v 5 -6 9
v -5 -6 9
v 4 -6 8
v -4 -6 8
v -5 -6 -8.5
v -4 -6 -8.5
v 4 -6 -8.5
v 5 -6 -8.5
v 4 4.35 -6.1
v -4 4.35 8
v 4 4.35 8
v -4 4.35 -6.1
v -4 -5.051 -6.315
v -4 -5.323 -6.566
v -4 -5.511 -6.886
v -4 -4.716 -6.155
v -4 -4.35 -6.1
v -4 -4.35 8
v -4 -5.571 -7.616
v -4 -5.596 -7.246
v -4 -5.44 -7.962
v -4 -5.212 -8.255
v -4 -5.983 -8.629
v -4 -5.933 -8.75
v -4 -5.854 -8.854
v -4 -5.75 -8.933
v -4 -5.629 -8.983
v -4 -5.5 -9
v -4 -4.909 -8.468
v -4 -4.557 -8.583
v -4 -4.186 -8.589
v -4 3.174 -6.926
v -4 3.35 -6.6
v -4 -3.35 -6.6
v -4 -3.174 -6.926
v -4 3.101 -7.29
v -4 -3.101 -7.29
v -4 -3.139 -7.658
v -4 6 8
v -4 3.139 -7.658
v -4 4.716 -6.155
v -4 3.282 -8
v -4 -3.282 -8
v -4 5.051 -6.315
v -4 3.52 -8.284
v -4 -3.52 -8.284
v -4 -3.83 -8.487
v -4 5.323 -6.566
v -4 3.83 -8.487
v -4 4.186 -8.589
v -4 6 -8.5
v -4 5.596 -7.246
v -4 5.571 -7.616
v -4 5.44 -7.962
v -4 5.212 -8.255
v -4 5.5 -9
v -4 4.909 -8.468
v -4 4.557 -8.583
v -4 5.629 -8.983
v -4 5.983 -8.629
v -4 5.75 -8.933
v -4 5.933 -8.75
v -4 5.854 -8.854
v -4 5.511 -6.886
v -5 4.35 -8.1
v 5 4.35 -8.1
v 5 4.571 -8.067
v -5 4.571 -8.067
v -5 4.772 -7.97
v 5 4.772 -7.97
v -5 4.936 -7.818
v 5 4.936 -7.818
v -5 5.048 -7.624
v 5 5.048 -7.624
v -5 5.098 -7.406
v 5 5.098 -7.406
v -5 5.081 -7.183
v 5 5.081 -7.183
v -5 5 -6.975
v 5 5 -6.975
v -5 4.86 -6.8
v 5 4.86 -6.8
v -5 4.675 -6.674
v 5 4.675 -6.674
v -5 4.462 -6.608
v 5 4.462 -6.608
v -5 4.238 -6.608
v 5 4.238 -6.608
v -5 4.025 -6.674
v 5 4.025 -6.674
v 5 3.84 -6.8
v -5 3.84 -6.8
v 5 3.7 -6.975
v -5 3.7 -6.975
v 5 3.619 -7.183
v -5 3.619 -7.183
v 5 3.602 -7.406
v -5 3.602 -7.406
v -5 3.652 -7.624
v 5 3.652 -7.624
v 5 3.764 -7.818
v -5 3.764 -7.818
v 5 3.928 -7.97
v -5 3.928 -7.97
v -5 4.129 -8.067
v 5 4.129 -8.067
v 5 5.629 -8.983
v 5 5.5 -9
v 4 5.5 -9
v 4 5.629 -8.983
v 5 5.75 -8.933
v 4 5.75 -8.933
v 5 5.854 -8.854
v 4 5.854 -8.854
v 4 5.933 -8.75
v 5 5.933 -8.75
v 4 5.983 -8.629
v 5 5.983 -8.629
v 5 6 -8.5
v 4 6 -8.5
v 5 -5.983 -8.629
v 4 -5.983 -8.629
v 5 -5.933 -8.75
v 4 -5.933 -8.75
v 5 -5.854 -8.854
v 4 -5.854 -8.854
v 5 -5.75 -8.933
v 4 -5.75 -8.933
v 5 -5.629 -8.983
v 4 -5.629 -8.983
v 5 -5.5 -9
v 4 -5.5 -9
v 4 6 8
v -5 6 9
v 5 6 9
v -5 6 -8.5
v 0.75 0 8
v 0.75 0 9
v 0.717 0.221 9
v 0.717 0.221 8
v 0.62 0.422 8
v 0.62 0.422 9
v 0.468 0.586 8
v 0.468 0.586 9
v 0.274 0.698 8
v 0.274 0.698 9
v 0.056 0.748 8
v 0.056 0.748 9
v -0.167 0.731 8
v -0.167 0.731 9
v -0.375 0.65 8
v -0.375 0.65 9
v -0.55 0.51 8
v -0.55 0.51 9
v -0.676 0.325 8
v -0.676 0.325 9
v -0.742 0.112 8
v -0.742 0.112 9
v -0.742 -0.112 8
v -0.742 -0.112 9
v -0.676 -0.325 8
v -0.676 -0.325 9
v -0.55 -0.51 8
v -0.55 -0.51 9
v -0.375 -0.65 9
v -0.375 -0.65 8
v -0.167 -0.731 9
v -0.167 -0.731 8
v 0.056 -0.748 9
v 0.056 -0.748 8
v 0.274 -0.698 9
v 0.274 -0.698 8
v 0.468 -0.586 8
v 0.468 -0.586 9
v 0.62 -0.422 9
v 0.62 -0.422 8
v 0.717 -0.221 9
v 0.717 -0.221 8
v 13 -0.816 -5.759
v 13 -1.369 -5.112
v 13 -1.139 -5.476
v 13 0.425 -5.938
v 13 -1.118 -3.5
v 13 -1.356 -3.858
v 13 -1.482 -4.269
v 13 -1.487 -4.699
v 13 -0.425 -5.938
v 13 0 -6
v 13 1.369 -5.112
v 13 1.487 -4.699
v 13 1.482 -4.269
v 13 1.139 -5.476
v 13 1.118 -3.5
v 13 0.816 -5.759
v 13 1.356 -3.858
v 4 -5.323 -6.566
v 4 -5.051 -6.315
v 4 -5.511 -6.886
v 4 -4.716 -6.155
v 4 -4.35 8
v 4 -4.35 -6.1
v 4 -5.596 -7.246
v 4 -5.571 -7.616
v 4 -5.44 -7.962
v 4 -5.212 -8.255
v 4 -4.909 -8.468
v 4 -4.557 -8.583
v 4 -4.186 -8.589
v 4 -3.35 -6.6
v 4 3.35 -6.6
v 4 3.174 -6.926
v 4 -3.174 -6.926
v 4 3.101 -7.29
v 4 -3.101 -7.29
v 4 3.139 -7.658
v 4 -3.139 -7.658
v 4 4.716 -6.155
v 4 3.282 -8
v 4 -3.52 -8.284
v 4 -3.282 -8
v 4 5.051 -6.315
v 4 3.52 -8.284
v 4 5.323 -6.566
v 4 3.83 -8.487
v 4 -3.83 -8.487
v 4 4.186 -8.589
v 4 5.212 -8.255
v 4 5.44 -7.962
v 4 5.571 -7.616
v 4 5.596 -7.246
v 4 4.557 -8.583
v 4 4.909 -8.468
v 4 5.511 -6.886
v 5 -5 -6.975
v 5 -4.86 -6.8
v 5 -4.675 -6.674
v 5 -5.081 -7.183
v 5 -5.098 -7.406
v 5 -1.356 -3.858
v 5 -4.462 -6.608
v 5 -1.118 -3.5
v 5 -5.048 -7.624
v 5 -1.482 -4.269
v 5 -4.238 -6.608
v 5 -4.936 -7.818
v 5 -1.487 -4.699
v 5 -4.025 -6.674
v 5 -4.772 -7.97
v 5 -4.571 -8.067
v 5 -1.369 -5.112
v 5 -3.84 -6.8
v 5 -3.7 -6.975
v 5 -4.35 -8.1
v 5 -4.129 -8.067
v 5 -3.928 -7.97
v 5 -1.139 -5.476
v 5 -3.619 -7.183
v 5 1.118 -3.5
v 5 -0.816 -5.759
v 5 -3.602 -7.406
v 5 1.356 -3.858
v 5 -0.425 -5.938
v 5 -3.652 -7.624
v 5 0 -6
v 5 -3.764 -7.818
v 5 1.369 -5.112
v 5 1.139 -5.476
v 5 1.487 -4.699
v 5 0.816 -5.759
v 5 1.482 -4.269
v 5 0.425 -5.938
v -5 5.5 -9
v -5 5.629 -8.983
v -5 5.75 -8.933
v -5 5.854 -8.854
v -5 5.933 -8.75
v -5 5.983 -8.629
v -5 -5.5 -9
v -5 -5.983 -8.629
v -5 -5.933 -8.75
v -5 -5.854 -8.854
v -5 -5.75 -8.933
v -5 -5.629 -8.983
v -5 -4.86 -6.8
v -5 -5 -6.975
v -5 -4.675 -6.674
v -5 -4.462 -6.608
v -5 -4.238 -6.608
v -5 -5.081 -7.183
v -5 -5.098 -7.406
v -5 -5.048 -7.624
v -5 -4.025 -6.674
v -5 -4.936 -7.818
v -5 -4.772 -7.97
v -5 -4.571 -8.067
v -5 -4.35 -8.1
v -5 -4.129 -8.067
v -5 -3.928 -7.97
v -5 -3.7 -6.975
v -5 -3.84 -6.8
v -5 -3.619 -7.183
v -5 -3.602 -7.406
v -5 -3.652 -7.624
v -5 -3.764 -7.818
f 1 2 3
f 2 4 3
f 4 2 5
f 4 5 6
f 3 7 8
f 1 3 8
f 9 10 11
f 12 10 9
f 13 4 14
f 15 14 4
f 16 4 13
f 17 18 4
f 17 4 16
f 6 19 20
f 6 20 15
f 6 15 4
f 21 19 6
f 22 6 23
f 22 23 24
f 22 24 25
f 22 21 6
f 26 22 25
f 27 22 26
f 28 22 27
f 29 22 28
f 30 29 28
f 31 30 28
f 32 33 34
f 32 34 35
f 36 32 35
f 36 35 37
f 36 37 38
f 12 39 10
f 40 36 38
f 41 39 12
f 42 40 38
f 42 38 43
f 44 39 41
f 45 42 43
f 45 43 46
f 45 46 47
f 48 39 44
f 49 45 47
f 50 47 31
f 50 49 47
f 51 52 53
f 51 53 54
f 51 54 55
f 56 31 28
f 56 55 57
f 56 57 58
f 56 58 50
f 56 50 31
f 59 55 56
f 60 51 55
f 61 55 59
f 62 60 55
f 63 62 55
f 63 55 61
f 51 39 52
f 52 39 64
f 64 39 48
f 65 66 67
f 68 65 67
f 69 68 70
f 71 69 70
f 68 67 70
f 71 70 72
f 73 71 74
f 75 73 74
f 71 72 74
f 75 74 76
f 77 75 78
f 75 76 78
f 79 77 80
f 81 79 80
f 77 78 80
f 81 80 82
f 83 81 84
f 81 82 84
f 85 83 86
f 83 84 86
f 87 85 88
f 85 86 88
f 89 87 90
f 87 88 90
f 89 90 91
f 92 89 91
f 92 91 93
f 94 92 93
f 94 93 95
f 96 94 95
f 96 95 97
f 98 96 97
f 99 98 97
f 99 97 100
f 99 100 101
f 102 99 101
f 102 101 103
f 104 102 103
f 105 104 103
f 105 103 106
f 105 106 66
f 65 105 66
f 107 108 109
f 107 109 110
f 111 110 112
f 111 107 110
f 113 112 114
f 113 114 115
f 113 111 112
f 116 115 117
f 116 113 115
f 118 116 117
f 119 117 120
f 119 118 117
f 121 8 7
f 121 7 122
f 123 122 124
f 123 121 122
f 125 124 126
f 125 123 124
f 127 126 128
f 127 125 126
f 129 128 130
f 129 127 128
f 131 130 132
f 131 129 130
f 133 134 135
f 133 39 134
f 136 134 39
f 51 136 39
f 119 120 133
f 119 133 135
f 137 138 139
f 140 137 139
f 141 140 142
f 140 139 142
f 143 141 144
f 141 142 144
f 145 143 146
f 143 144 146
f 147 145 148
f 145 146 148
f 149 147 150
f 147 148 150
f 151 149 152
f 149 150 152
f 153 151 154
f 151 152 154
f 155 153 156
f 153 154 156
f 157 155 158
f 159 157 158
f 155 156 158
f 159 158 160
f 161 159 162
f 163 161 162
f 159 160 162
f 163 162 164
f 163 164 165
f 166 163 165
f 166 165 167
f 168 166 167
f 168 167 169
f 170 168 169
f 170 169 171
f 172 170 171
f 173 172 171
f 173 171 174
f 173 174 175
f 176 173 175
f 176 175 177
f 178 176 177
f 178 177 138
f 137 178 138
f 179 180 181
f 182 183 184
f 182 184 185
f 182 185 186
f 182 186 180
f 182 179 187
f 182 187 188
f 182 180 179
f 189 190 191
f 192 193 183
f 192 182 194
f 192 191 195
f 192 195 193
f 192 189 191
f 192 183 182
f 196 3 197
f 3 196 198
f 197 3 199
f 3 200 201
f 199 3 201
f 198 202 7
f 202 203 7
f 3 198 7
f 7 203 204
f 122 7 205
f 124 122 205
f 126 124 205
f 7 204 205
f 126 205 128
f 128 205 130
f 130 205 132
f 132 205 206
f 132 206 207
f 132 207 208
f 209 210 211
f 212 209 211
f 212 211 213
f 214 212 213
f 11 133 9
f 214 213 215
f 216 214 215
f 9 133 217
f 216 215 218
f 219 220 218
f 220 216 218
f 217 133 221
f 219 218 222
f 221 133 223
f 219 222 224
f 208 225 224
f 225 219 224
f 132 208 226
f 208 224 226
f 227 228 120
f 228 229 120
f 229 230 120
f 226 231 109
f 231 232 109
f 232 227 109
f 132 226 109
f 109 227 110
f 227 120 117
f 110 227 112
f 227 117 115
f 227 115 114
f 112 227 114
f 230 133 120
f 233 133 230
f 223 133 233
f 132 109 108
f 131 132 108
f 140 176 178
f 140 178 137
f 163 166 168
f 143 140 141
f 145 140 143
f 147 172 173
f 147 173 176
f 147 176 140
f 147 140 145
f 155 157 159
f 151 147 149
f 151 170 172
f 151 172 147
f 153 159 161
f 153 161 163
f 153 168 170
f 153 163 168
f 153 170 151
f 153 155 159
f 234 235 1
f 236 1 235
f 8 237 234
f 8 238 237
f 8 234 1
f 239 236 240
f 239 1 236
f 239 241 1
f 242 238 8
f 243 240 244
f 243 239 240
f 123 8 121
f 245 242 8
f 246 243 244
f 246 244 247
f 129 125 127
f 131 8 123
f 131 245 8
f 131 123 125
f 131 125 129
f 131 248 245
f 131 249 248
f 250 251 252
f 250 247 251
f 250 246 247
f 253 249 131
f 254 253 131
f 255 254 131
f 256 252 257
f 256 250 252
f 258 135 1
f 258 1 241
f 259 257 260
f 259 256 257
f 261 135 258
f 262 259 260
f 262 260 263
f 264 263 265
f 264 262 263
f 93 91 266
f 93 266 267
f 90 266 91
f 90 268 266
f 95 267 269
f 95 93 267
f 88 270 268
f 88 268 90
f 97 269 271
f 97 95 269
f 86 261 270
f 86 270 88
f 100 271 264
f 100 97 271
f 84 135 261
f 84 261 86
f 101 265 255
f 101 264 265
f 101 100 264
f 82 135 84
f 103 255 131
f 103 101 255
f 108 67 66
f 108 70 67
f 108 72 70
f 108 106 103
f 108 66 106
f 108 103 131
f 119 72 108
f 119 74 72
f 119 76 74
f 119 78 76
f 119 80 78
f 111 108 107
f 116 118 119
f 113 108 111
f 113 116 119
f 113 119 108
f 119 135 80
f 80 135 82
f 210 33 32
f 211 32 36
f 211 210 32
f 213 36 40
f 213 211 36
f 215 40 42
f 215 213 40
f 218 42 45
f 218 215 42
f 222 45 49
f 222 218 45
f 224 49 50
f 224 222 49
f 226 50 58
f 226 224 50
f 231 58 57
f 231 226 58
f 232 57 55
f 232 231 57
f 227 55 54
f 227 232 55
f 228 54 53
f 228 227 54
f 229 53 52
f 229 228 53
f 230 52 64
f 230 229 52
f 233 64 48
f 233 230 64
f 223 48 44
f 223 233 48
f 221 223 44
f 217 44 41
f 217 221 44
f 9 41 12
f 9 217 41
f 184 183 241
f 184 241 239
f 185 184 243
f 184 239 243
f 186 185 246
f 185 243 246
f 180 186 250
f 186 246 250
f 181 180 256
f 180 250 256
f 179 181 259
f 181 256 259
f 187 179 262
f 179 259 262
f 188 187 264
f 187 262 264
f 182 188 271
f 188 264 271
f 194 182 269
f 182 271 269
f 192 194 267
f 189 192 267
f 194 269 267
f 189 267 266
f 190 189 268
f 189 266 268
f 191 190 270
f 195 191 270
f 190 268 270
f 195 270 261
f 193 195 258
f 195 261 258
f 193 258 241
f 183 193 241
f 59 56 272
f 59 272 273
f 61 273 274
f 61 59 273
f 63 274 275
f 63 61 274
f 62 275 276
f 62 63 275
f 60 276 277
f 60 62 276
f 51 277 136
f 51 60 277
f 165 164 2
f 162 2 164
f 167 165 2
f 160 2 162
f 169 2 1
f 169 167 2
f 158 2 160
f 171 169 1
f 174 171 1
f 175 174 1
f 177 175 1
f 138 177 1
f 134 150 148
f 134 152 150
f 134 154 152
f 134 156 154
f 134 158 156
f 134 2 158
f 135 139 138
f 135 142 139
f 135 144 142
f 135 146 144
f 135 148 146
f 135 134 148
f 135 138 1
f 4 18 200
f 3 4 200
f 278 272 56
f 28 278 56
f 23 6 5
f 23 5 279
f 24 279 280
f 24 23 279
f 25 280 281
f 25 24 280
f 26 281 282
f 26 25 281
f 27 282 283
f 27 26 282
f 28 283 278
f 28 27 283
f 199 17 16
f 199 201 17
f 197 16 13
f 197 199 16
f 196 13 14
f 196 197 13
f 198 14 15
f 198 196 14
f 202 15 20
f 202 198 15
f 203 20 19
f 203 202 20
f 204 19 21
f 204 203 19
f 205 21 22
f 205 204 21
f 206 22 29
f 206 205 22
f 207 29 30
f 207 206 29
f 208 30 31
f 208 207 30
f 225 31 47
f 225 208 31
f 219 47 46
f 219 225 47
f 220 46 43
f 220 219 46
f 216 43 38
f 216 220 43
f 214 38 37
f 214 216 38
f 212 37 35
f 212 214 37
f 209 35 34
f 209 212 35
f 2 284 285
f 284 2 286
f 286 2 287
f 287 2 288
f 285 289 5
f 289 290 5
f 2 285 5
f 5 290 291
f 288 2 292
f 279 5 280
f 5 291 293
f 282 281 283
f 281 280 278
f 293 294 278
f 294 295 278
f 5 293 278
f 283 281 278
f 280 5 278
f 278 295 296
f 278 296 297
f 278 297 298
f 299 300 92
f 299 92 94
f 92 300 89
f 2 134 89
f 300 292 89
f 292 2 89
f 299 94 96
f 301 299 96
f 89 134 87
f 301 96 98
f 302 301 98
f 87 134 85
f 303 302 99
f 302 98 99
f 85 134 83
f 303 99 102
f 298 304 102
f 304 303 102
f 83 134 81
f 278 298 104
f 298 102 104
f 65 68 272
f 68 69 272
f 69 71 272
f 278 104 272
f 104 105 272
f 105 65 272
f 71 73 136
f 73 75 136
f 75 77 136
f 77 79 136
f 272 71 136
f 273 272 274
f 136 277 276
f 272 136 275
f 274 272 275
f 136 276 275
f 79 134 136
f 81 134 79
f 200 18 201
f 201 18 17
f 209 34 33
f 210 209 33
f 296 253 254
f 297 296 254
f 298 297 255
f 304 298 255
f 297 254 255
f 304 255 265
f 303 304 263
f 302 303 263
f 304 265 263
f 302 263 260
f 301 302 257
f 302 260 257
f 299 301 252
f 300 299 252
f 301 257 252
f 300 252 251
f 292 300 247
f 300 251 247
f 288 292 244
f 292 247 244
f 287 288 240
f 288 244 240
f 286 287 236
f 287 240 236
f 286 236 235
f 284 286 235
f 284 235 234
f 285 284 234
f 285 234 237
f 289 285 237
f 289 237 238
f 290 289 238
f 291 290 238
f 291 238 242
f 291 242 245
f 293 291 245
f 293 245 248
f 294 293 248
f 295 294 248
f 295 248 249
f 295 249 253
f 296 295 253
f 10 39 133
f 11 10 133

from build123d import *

# Parameters (mm, degrees)
ESBO_O1_W                = 10
ESBO_O1_H                = 18
RESSALTO_EXTRUS_O1_DEPTH = 6
RESSALTO_EXTRUS_O2_DEPTH = 8
FILETE1_R                = 0.5
ESBO_O3_W                = 8
ESBO_O3_H                = 17
CORTE_EXTRUS_O1_DEPTH    = 13
RESSALTO_EXTRUS_O3_REACH = 12
ESBO_O4_R                = 1.25
ESBO_O5_R                = 0.75
CORTE_EXTRUS_O2_DEPTH    = 11
CORTE_EXTRUS_O3_REACH    = 20
ESBO_O6_R                = 0.75
RESSALTO_EXTRUS_O6_REACH = 19
ESBO_O7_W                = 14.6
ESBO_O7_H                = 8.7


with BuildPart() as part:
    # Esboço1 → Ressalto-extrusão1 (new body, symmetric)
    with BuildSketch(Plane(origin=(0, 0, 0), x_dir=(1, 0, 0), z_dir=(0, 1, 0))):
        Rectangle(ESBO_O1_W, ESBO_O1_H)
    extrude(amount=RESSALTO_EXTRUS_O1_DEPTH, both=True)

    # Esboço2 → Ressalto-extrusão2 (add)
    with BuildSketch(Plane(origin=(5, 0, 0), x_dir=(0, 0, -1), z_dir=(1, 0, 0))):
        with BuildLine():
            Line((3.5, 1.118033989), (3.5, -1.118033989))
            ThreePointArc((3.5, -1.118033989), (6, 0), (3.5, 1.118033989))
        make_face()
    extrude(amount=RESSALTO_EXTRUS_O2_DEPTH)

    # Filete1
    filete1_edges = [part.edges().sort_by_distance(p)[0] for p in [
        (0, -6, -9),
        (0, 6, -9),
    ]]
    fillet(filete1_edges, radius=FILETE1_R)

    # Esboço3 → Corte-extrusão1 (cut, through all)
    with BuildSketch(Plane(origin=(0, 6, 0), x_dir=(1, 0, 0), z_dir=(0, 1, 0))):
        with Locations((0, 0.5)):
            Rectangle(ESBO_O3_W, ESBO_O3_H)
    extrude(amount=-CORTE_EXTRUS_O1_DEPTH, mode=Mode.SUBTRACT)

    # Esboço4 → Ressalto-extrusão3 (add, up to next)
    with BuildSketch(Plane(origin=(5, 0, 0), x_dir=(0, 0, -1), z_dir=(1, 0, 0)), mode=Mode.PRIVATE) as ressalto_extrus_o3_sk1:
        with Locations((7.35, 4.35)):
            Circle(ESBO_O4_R)
    ressalto_extrus_o3_tool1 = extrude(ressalto_extrus_o3_sk1.sketch, amount=-RESSALTO_EXTRUS_O3_REACH, mode=Mode.PRIVATE) - part.part
    add(ressalto_extrus_o3_tool1.solids().sort_by_distance((5, 4.35, -7.35))[0])
    # Esboço4 → Ressalto-extrusão3 (add, up to next)
    with BuildSketch(Plane(origin=(5, 0, 0), x_dir=(0, 0, -1), z_dir=(1, 0, 0)), mode=Mode.PRIVATE) as ressalto_extrus_o3_sk2:
        with Locations((7.35, -4.35)):
            Circle(ESBO_O4_R)
    ressalto_extrus_o3_tool2 = extrude(ressalto_extrus_o3_sk2.sketch, amount=-RESSALTO_EXTRUS_O3_REACH, mode=Mode.PRIVATE) - part.part
    add(ressalto_extrus_o3_tool2.solids().sort_by_distance((5, -4.35, -7.35))[0])

    # Esboço5 → Corte-extrusão2 (cut, through all)
    with BuildSketch(Plane(origin=(5, 0, 0), x_dir=(0, 0, -1), z_dir=(1, 0, 0))):
        with Locations((7.35, 4.35)):
            Circle(ESBO_O5_R)
        with Locations((7.35, -4.35)):
            Circle(ESBO_O5_R)
    extrude(amount=-CORTE_EXTRUS_O2_DEPTH, mode=Mode.SUBTRACT)

    # Esboço6 → Corte-extrusão3 (cut, up to next)
    with BuildSketch(Plane.XY.offset(9), mode=Mode.PRIVATE) as corte_extrus_o3_sk1:
        Circle(ESBO_O6_R)
    corte_extrus_o3_tool1 = extrude(corte_extrus_o3_sk1.sketch, amount=-CORTE_EXTRUS_O3_REACH, mode=Mode.PRIVATE) & part.part
    add(corte_extrus_o3_tool1.solids().sort_by_distance((0, 0, 9))[0], mode=Mode.SUBTRACT)

    # Esboço7 → Ressalto-extrusão6 (add, up to next)
    with BuildSketch(Plane(origin=(-4, 0, 0), x_dir=(0, 0, -1), z_dir=(1, 0, 0)), mode=Mode.PRIVATE) as ressalto_extrus_o6_sk1:
        with Locations((-0.7, 0)):
            Rectangle(ESBO_O7_W, ESBO_O7_H)
    ressalto_extrus_o6_tool1 = extrude(ressalto_extrus_o6_sk1.sketch, amount=RESSALTO_EXTRUS_O6_REACH, mode=Mode.PRIVATE) - part.part
    add(ressalto_extrus_o6_tool1.solids().sort_by_distance((-4, 0, 0.7))[0])


solid = part.part
